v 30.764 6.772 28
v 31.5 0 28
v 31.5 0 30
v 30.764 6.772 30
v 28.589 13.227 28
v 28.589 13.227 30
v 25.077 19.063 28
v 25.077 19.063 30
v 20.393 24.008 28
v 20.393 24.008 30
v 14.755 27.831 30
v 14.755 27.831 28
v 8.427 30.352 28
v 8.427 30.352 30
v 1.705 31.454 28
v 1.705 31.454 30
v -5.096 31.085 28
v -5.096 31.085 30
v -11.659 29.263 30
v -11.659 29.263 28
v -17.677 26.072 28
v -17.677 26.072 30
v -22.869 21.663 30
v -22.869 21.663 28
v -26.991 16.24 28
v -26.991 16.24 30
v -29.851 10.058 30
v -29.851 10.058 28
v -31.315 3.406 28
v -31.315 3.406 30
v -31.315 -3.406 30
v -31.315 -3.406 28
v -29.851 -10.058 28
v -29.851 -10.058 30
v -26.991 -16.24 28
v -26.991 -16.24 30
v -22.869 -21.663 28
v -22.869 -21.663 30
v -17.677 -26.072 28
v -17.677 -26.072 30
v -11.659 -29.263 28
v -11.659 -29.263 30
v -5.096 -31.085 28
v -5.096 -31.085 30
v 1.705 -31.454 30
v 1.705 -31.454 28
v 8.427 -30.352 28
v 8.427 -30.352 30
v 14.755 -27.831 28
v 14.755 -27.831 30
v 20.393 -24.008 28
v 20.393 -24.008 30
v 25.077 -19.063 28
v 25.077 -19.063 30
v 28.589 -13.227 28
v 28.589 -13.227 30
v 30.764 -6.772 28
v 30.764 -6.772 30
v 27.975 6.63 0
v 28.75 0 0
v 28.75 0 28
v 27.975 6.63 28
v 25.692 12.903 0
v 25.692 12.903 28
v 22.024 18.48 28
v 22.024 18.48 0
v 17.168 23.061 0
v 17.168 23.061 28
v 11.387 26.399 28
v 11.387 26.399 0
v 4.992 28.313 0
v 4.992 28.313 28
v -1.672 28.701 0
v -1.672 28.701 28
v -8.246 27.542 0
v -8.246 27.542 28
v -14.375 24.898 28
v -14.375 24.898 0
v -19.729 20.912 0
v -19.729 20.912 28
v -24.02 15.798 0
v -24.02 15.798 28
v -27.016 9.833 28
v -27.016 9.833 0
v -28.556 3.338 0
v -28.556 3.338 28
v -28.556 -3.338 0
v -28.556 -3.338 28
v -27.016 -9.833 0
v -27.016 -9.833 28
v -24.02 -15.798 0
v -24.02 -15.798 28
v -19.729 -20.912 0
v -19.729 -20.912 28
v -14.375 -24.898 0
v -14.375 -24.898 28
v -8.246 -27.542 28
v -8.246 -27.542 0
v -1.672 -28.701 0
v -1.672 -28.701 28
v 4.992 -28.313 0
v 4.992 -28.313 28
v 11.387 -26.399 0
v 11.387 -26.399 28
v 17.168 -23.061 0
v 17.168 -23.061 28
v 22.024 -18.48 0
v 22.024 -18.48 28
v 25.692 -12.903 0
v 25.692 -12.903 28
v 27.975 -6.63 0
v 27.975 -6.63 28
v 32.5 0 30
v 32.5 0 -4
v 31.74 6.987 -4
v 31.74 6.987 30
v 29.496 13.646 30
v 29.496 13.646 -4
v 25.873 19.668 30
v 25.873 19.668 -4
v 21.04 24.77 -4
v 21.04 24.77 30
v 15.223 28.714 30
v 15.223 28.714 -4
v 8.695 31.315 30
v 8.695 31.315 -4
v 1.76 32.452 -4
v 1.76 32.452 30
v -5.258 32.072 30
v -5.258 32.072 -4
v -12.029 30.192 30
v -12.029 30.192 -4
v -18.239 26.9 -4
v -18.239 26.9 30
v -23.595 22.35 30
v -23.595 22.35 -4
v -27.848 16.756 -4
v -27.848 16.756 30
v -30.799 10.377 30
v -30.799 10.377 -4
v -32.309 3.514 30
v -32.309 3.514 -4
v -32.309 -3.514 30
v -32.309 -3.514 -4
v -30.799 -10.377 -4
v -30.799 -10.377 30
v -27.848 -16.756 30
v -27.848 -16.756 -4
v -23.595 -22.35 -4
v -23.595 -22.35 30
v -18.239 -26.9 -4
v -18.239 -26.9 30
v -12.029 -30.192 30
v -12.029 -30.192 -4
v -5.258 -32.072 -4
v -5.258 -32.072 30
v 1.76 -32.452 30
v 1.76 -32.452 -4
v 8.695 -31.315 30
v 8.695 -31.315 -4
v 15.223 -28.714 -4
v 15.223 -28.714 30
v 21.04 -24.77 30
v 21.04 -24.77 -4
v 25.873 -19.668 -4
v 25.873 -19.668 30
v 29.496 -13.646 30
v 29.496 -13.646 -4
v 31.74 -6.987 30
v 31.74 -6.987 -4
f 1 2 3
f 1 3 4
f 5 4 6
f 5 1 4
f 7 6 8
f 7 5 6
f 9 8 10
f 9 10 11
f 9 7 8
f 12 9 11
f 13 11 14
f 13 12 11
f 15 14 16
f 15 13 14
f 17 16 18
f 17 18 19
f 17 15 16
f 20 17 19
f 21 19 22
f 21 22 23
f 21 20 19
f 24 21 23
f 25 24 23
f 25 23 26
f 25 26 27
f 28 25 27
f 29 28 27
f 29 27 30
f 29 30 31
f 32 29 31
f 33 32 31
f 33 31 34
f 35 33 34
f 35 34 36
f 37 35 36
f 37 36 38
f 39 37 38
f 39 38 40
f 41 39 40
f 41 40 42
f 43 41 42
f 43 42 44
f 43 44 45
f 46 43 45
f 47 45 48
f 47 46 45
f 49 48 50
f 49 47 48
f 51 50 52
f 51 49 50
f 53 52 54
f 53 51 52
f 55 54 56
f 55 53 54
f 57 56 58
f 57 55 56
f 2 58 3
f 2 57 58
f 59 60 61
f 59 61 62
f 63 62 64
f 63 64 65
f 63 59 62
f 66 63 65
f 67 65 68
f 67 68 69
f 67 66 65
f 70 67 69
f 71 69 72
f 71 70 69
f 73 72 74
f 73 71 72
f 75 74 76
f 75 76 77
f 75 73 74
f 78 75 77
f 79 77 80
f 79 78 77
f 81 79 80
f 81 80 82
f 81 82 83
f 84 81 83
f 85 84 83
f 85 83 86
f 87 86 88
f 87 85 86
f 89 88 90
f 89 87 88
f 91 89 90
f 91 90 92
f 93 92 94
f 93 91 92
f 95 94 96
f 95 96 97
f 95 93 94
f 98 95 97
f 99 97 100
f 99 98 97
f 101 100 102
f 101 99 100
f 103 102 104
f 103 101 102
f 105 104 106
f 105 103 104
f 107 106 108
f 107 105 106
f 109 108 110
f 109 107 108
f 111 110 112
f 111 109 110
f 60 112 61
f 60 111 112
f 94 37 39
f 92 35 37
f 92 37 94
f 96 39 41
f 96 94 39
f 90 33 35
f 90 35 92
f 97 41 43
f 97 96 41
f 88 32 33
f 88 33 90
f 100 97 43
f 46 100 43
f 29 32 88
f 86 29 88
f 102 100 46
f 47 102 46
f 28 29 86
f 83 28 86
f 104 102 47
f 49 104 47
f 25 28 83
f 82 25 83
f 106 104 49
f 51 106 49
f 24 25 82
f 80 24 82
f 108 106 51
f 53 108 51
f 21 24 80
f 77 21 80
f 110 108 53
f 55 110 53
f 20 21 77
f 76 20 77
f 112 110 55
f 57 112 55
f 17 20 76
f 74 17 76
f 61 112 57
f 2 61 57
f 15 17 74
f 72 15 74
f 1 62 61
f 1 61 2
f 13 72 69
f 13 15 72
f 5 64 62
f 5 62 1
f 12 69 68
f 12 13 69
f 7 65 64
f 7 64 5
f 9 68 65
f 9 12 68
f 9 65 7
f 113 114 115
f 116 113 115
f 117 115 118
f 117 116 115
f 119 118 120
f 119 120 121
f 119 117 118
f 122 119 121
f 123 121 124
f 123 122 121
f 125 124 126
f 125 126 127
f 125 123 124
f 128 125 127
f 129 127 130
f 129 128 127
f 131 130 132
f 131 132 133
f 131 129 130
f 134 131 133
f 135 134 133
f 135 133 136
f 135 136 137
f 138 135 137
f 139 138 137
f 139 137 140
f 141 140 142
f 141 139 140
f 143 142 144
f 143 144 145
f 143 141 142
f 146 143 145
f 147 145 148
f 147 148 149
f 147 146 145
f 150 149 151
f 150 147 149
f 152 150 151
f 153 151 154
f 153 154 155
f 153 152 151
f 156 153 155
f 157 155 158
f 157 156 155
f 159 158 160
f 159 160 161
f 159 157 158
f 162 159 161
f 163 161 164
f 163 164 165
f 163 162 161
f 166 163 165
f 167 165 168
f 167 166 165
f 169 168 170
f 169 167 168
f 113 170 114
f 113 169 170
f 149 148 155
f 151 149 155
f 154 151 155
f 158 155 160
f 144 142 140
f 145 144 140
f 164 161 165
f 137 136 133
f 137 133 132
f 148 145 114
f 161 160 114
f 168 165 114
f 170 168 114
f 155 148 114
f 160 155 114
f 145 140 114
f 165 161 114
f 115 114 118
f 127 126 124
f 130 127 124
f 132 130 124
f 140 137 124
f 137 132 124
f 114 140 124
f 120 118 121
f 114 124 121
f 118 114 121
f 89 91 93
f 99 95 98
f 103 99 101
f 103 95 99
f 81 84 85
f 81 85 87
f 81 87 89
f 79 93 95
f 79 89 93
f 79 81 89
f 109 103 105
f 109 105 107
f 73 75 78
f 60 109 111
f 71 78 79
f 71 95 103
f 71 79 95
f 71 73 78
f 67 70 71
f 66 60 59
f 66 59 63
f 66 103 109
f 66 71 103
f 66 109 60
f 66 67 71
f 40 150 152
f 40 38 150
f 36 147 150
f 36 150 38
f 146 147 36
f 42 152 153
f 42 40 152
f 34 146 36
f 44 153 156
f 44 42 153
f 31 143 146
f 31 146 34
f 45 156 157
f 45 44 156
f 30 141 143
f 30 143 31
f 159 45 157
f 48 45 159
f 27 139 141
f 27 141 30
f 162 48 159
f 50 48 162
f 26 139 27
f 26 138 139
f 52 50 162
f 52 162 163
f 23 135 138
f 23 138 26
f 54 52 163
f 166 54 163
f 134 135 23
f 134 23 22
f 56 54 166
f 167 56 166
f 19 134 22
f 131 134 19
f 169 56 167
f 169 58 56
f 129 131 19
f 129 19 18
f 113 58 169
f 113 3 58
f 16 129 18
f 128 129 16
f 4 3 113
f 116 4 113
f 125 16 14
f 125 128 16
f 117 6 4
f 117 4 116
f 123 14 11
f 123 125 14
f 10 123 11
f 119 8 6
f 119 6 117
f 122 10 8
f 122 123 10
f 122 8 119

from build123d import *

# Parameters (mm, degrees)
F0_R     = 31.5
F0_R_2   = 28.75
F1_DEPTH = 28
F0_R_3   = 32.5
F2_DEPTH = 30
F3_DEPTH = 4


with BuildPart() as f1:
    # F0 (on Top) → F1 (new body)
    with BuildSketch(Plane.XY):
        Circle(F0_R)
        Circle(F0_R_2, mode=Mode.SUBTRACT)
    extrude(amount=F1_DEPTH)

    # F0 (on Top) → F2 (join)
    with BuildSketch(Plane.XY):
        Circle(F0_R_3)
        Circle(F0_R, mode=Mode.SUBTRACT)
    extrude(amount=F2_DEPTH)

    # F0 (on Top) → F3 (join)
    with BuildSketch(Plane.XY):
        Circle(F0_R_3)
        Circle(F0_R, mode=Mode.SUBTRACT)
        Circle(F0_R)
        Circle(F0_R_2, mode=Mode.SUBTRACT)
        Circle(F0_R_2)
    extrude(amount=-F3_DEPTH)


solid = f1.part
